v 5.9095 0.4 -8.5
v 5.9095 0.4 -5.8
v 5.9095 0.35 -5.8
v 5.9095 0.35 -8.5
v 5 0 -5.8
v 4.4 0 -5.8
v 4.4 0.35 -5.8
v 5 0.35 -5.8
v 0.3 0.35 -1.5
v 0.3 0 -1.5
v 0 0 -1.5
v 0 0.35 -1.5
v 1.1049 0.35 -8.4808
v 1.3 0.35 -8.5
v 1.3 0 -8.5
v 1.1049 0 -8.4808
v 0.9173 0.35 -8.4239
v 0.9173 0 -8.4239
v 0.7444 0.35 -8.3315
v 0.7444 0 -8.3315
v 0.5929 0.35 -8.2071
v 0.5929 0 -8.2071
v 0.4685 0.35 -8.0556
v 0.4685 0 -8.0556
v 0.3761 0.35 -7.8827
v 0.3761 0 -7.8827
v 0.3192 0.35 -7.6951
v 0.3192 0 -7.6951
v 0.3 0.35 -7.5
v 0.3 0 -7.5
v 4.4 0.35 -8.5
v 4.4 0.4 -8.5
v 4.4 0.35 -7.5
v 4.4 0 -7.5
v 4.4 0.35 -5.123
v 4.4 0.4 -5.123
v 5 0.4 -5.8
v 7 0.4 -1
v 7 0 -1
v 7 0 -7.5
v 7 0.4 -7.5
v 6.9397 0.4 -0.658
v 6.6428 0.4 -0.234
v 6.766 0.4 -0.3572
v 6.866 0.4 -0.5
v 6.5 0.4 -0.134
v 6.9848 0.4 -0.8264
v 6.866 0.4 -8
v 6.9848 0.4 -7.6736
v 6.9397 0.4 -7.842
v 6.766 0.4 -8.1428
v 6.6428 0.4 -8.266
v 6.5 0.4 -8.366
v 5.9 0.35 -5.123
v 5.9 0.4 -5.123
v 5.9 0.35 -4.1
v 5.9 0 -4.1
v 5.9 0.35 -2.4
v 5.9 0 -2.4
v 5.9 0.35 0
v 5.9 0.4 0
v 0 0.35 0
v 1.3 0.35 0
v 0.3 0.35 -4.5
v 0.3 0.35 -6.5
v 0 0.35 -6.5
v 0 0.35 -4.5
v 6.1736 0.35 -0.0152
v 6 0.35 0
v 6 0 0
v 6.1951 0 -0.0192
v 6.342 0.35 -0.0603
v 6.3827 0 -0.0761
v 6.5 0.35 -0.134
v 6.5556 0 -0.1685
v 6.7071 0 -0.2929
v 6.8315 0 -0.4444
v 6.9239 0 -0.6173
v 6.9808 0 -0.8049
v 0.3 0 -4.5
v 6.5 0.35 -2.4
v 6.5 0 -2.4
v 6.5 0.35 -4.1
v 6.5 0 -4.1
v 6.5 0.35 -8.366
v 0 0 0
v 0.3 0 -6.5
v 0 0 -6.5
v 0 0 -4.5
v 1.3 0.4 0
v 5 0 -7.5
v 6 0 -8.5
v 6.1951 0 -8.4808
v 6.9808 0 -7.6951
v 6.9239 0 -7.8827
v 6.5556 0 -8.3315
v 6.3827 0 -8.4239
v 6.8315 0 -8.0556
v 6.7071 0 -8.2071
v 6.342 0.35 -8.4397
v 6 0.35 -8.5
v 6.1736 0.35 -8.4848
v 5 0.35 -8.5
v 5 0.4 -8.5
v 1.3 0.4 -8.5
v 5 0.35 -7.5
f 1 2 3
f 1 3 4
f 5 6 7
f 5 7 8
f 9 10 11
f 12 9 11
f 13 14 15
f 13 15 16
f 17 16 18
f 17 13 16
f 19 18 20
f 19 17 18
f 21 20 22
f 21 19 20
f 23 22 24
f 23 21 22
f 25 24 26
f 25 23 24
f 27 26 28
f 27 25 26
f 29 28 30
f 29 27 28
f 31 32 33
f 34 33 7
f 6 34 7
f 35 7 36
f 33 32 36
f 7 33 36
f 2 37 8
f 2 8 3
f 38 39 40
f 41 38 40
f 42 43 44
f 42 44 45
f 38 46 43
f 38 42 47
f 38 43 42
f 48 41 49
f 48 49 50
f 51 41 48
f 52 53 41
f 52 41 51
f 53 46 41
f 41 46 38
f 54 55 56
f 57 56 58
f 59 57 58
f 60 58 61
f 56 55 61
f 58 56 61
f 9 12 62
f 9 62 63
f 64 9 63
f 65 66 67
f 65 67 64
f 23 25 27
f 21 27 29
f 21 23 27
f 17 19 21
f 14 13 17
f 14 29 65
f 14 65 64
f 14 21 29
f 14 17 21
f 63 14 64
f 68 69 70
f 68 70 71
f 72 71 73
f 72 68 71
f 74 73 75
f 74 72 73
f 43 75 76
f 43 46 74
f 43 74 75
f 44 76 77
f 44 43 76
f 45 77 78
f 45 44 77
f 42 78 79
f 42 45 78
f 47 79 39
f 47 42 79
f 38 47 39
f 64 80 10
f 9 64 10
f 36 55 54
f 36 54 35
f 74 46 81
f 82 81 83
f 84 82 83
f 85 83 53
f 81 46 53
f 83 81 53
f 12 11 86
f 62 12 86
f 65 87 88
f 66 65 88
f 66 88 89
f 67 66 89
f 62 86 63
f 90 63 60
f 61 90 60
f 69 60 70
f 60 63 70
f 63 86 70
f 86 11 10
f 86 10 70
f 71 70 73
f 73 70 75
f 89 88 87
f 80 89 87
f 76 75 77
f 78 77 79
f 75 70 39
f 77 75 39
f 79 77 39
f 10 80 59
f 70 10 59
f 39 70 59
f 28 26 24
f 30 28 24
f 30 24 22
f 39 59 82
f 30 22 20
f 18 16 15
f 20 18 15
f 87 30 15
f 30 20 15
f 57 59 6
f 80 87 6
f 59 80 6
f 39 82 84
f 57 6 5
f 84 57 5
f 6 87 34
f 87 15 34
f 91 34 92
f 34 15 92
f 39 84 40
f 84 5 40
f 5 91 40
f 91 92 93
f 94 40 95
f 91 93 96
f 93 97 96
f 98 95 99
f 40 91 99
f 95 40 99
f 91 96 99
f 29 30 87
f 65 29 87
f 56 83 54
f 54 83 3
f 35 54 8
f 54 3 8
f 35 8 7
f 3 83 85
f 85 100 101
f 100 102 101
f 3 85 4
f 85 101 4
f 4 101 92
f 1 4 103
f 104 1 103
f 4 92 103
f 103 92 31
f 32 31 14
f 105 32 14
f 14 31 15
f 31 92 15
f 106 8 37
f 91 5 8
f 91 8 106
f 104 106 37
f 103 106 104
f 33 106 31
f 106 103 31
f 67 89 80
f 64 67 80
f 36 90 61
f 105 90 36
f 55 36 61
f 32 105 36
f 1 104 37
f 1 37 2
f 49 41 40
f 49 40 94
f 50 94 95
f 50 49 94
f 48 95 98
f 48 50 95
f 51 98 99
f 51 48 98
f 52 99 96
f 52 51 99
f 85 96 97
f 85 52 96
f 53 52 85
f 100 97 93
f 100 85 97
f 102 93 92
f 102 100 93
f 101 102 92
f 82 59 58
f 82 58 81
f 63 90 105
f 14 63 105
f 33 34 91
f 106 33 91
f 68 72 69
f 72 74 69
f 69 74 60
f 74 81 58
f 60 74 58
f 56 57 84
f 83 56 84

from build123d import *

# Parameters (mm, degrees)
SKETCH1_W           = 0.6
SKETCH1_H           = 1.7
BOSS_EXTRUDE1_DEPTH = 0.4
FILLET2_R           = 1
SKETCH2_W           = 1.780104135
SKETCH2_H           = 8.5
CUT_EXTRUDE1_DEPTH  = 0.05


with BuildPart() as part:
    # Sketch1 → Boss-Extrude1 (new body)
    with BuildSketch(Plane(origin=(0, 0, 0), x_dir=(1, 0, 0), z_dir=(0, 1, 0))):
        Polygon((0, 0), (7, 0), (7, 8.5), (0.3, 8.5), (0.3, 6.5), (0, 6.5), (0, 4.5), (0.3, 4.5), (0.3, 1.5), (0, 1.5), align=None)
        with Locations((4.7, 6.65)):
            Rectangle(SKETCH1_W, SKETCH1_H, mode=Mode.SUBTRACT)
        with Locations((6.2, 3.25)):
            Rectangle(SKETCH1_W, SKETCH1_H, mode=Mode.SUBTRACT)
    extrude(amount=BOSS_EXTRUDE1_DEPTH)

    # Fillet2
    fillet2_edges = [part.edges().sort_by_distance(p)[0] for p in [
        (0.3, 0.2, -8.5),
        (7, 0.2, -8.5),
        (7, 0.2, 0),
    ]]
    fillet(fillet2_edges, radius=FILLET2_R)

    # Sketch2 → Cut-Extrude1 (cut)
    with BuildSketch(Plane(origin=(0, 0.4, 0), x_dir=(1, 0, 0), z_dir=(0, 1, 0))):
        with Locations((0.409947933, 4.25)):
            Rectangle(SKETCH2_W, SKETCH2_H)
        Polygon((4.4, 7.5), (4.4, 8.794208179), (5, 8.794208179), (5, 7.5), (5, 5.8), (5.909455283, 5.8), (5.909455283, 8.5), (6.5, 8.5), (6.5, 5.123047138), (6.5, 4.1), (6.5, 0), (5.9, 0), (5.9, 4.1), (5.9, 5.123047138), (4.4, 5.123047138), align=None)
    extrude(amount=-CUT_EXTRUDE1_DEPTH, mode=Mode.SUBTRACT)


solid = part.part
